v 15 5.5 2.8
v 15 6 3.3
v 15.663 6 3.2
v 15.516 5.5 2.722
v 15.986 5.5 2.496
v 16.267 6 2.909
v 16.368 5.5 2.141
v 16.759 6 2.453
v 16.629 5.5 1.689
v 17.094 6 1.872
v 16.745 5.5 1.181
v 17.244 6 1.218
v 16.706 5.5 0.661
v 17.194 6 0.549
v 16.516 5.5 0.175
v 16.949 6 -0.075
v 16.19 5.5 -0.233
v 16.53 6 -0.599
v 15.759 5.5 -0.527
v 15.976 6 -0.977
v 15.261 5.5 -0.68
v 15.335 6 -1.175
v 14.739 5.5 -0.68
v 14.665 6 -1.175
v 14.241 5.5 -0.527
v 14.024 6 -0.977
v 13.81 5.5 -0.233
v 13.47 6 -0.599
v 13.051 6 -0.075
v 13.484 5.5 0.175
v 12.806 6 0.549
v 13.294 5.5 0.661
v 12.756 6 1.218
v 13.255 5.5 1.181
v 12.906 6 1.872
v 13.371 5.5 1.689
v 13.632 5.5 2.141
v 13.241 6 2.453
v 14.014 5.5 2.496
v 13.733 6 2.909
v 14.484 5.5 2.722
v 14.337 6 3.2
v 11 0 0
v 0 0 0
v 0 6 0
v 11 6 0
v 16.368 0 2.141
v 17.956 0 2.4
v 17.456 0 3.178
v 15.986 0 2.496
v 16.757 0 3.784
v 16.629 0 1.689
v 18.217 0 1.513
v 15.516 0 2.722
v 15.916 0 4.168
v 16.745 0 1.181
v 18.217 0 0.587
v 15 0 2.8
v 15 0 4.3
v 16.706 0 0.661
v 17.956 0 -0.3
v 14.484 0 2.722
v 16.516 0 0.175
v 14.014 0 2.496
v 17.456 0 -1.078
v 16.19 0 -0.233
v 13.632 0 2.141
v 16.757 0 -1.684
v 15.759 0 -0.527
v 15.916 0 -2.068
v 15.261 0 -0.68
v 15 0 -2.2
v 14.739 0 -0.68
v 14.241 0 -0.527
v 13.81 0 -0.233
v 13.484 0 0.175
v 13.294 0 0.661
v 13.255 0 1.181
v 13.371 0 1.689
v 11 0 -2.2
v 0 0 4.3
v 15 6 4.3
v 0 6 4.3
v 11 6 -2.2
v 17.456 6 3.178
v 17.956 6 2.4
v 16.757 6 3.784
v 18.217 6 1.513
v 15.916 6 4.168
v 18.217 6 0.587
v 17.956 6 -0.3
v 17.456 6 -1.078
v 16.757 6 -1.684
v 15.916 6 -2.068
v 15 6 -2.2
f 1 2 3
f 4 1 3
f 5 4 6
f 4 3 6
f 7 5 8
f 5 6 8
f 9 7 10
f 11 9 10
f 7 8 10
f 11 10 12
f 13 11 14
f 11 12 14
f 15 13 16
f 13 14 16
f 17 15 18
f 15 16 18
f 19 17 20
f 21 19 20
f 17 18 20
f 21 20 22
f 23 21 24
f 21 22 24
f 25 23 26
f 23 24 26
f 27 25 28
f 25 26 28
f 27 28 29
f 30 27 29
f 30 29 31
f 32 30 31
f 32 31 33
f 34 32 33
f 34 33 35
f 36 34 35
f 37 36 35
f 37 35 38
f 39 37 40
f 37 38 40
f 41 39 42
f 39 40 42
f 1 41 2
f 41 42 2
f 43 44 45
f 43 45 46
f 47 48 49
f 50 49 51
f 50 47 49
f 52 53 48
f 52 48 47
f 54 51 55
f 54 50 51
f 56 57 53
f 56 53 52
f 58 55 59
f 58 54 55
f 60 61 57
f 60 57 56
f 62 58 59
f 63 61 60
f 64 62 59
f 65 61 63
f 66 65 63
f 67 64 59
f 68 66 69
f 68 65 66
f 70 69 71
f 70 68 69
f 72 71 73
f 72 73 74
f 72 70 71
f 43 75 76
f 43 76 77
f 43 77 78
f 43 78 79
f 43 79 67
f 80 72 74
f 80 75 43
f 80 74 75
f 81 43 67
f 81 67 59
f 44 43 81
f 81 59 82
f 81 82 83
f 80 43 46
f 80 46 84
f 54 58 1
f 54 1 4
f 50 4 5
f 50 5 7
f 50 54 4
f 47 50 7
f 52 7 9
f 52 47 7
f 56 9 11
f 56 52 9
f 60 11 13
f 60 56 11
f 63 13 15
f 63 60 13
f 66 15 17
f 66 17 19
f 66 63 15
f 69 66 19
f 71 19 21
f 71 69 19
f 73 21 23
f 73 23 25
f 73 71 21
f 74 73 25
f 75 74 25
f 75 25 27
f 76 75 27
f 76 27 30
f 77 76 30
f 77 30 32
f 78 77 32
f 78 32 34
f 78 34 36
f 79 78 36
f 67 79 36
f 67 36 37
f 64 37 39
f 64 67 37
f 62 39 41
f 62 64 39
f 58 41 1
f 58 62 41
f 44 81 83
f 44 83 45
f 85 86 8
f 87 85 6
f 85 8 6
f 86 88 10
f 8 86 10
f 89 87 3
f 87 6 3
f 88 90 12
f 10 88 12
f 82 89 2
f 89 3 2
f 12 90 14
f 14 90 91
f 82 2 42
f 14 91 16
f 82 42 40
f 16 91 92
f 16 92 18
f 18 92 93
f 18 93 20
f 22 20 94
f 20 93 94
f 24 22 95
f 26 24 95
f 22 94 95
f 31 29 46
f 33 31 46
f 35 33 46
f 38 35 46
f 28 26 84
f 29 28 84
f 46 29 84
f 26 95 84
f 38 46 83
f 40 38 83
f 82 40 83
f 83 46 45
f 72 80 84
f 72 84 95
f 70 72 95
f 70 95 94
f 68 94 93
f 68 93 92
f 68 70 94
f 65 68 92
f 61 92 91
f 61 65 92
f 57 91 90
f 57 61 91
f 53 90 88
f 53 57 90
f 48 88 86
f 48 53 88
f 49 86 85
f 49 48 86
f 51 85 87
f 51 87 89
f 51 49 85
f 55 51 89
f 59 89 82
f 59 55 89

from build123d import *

# Parameters (mm, degrees)
SKETCH2_R           = 1.75
BOSS_EXTRUDE1_DEPTH = 6
CHAMFER1_SIZE       = 0.5


with BuildPart() as part:
    # Sketch2 → Boss-Extrude1 (new body)
    with BuildSketch(Plane(origin=(0, 0, 0), x_dir=(1, 0, 0), z_dir=(0, 1, 0))):
        with BuildLine():
            Line((11, 2.2), (15, 2.2))
            ThreePointArc((15, 2.2), (18.25, -1.05), (15, -4.3))
            Line((15, -4.3), (0, -4.3))
            Line((0, -4.3), (0, 0))
            Line((0, 0), (11, 0))
            Line((11, 0), (11, 2.2))
        make_face()
        with Locations(Location((15, -1.05, 0), (0, 0, 270))):
            Circle(SKETCH2_R, mode=Mode.SUBTRACT)
    extrude(amount=BOSS_EXTRUDE1_DEPTH)

    # Chamfer1
    chamfer1_edges = [part.edges().sort_by_distance(p)[0] for p in [
        (15, 6, -0.7),
    ]]
    chamfer(chamfer1_edges, length=CHAMFER1_SIZE)


solid = part.part
